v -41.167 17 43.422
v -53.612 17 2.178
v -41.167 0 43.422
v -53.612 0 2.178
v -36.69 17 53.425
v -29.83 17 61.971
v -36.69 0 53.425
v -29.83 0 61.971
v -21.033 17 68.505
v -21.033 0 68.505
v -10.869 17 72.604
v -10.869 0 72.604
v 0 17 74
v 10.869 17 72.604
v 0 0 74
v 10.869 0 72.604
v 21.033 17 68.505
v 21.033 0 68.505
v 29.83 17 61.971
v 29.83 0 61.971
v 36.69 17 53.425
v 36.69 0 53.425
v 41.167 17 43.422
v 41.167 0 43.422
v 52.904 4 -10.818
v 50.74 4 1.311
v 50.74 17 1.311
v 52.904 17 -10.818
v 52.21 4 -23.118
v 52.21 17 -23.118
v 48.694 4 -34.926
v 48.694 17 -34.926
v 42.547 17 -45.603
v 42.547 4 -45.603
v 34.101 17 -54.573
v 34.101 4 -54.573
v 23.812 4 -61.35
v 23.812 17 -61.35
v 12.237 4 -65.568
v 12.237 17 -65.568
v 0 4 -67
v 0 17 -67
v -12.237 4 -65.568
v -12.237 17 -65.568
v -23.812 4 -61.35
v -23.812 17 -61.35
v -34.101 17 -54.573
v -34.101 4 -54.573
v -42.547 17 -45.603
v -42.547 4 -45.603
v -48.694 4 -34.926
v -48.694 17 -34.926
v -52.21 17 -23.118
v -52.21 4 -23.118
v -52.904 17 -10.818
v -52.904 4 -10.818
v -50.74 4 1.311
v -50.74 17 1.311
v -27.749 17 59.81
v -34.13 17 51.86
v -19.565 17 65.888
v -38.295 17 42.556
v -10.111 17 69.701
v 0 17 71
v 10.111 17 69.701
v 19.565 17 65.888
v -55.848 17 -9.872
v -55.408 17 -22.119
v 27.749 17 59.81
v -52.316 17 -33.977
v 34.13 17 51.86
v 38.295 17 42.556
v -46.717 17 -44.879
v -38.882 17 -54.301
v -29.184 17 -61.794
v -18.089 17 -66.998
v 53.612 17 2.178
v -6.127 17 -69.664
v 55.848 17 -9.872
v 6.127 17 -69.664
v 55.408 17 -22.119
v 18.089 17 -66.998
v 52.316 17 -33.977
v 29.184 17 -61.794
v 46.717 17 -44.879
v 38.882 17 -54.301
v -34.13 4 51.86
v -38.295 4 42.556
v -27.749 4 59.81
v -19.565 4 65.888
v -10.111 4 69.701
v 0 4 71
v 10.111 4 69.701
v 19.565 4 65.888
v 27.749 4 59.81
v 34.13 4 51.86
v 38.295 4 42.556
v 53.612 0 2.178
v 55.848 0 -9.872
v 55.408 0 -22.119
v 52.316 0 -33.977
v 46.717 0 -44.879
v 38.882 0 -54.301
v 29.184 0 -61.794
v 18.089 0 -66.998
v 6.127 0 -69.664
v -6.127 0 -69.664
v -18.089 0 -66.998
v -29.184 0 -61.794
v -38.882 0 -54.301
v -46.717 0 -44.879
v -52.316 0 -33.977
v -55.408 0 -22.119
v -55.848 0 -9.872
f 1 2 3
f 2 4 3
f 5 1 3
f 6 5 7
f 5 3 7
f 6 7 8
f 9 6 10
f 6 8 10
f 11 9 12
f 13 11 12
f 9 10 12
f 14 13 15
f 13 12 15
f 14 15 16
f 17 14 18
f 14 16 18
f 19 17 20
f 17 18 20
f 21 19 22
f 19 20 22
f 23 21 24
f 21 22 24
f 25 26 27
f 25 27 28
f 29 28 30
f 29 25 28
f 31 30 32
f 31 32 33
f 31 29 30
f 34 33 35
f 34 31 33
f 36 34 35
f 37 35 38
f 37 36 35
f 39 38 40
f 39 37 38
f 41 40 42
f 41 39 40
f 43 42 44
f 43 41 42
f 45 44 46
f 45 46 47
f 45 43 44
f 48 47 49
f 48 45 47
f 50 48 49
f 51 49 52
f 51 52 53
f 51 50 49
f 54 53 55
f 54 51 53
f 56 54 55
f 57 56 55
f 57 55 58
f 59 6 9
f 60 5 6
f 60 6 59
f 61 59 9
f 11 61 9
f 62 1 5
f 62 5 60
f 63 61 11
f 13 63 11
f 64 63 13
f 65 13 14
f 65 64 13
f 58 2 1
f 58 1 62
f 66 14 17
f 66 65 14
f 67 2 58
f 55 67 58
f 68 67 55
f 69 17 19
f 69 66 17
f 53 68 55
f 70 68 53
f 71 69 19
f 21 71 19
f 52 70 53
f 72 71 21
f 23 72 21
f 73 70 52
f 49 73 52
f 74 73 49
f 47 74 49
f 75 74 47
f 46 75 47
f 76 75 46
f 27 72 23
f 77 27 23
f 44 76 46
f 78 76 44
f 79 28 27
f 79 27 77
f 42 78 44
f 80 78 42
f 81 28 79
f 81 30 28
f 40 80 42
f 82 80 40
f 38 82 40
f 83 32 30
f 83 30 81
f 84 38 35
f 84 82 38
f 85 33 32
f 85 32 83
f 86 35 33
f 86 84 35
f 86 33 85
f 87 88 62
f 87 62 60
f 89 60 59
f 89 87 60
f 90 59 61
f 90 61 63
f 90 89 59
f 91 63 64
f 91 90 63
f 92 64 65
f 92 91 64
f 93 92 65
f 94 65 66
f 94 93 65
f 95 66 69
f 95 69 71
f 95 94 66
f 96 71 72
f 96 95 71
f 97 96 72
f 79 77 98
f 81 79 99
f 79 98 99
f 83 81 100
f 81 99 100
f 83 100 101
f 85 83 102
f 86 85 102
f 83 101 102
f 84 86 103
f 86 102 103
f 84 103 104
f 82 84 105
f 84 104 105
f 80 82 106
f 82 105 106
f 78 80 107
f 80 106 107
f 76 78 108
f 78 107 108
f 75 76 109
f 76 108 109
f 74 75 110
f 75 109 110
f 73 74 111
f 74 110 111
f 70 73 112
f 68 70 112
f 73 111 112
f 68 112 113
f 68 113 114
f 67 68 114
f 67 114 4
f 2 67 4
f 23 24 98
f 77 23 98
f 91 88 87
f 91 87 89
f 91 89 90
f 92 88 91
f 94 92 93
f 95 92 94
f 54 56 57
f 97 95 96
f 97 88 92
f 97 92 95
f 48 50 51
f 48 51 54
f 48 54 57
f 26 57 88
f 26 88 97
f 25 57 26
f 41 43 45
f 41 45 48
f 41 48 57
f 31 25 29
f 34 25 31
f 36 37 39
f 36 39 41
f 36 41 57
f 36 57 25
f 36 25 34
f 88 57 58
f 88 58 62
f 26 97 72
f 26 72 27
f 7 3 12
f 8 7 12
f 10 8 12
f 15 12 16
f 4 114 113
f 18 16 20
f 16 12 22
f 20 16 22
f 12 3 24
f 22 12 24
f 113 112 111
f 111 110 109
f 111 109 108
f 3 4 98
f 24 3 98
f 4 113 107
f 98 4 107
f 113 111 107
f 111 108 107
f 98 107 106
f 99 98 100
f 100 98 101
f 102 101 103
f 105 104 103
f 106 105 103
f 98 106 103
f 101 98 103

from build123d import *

# Parameters (mm, degrees)
SALIENTE_EXTRUIR1_DEPTH = 4
SALIENTE_EXTRUIR3_DEPTH = 13


with BuildPart() as part:
    # Croquis1 → Saliente-Extruir1 (new body)
    with BuildSketch(Plane(origin=(0, 0, 0), x_dir=(1, 0, 0), z_dir=(0, 1, 0))):
        with BuildLine():
            Line((-53.612307413, -2.177777778), (-41.166593192, -43.422222222))
            ThreePointArc((-41.166593192, -43.422222222), (0, -74), (41.166593192, -43.422222222))
            Line((41.166593192, -43.422222222), (53.612307413, -2.177777778))
            ThreePointArc((53.612307413, -2.177777778), (0, 70), (-53.612307413, -2.177777778))
        make_face()
    extrude(amount=SALIENTE_EXTRUIR1_DEPTH)

    # Croquis3 → Saliente-Extruir3 (add)
    with BuildSketch(Plane(origin=(0, 4, 0), x_dir=(1, 0, 0), z_dir=(0, 1, 0))):
        with BuildLine():
            Line((41.166593192, -43.422222222), (53.612307413, -2.177777778))
            ThreePointArc((53.612307413, -2.177777778), (0, 70), (-53.612307413, -2.177777778))
            Line((-53.612307413, -2.177777778), (-41.166593192, -43.422222222))
            ThreePointArc((-41.166593192, -43.422222222), (0, -74), (41.166593192, -43.422222222))
        make_face()
        with BuildLine():
            Line((38.294505295, -42.555555556), (50.740219516, -1.311111111))
            ThreePointArc((50.740219516, -1.311111111), (0, 67), (-50.740219516, -1.311111111))
            Line((-50.740219516, -1.311111111), (-38.294505295, -42.555555556))
            ThreePointArc((-38.294505295, -42.555555556), (0, -71), (38.294505295, -42.555555556))
        make_face(mode=Mode.SUBTRACT)
    extrude(amount=SALIENTE_EXTRUIR3_DEPTH)


solid = part.part
